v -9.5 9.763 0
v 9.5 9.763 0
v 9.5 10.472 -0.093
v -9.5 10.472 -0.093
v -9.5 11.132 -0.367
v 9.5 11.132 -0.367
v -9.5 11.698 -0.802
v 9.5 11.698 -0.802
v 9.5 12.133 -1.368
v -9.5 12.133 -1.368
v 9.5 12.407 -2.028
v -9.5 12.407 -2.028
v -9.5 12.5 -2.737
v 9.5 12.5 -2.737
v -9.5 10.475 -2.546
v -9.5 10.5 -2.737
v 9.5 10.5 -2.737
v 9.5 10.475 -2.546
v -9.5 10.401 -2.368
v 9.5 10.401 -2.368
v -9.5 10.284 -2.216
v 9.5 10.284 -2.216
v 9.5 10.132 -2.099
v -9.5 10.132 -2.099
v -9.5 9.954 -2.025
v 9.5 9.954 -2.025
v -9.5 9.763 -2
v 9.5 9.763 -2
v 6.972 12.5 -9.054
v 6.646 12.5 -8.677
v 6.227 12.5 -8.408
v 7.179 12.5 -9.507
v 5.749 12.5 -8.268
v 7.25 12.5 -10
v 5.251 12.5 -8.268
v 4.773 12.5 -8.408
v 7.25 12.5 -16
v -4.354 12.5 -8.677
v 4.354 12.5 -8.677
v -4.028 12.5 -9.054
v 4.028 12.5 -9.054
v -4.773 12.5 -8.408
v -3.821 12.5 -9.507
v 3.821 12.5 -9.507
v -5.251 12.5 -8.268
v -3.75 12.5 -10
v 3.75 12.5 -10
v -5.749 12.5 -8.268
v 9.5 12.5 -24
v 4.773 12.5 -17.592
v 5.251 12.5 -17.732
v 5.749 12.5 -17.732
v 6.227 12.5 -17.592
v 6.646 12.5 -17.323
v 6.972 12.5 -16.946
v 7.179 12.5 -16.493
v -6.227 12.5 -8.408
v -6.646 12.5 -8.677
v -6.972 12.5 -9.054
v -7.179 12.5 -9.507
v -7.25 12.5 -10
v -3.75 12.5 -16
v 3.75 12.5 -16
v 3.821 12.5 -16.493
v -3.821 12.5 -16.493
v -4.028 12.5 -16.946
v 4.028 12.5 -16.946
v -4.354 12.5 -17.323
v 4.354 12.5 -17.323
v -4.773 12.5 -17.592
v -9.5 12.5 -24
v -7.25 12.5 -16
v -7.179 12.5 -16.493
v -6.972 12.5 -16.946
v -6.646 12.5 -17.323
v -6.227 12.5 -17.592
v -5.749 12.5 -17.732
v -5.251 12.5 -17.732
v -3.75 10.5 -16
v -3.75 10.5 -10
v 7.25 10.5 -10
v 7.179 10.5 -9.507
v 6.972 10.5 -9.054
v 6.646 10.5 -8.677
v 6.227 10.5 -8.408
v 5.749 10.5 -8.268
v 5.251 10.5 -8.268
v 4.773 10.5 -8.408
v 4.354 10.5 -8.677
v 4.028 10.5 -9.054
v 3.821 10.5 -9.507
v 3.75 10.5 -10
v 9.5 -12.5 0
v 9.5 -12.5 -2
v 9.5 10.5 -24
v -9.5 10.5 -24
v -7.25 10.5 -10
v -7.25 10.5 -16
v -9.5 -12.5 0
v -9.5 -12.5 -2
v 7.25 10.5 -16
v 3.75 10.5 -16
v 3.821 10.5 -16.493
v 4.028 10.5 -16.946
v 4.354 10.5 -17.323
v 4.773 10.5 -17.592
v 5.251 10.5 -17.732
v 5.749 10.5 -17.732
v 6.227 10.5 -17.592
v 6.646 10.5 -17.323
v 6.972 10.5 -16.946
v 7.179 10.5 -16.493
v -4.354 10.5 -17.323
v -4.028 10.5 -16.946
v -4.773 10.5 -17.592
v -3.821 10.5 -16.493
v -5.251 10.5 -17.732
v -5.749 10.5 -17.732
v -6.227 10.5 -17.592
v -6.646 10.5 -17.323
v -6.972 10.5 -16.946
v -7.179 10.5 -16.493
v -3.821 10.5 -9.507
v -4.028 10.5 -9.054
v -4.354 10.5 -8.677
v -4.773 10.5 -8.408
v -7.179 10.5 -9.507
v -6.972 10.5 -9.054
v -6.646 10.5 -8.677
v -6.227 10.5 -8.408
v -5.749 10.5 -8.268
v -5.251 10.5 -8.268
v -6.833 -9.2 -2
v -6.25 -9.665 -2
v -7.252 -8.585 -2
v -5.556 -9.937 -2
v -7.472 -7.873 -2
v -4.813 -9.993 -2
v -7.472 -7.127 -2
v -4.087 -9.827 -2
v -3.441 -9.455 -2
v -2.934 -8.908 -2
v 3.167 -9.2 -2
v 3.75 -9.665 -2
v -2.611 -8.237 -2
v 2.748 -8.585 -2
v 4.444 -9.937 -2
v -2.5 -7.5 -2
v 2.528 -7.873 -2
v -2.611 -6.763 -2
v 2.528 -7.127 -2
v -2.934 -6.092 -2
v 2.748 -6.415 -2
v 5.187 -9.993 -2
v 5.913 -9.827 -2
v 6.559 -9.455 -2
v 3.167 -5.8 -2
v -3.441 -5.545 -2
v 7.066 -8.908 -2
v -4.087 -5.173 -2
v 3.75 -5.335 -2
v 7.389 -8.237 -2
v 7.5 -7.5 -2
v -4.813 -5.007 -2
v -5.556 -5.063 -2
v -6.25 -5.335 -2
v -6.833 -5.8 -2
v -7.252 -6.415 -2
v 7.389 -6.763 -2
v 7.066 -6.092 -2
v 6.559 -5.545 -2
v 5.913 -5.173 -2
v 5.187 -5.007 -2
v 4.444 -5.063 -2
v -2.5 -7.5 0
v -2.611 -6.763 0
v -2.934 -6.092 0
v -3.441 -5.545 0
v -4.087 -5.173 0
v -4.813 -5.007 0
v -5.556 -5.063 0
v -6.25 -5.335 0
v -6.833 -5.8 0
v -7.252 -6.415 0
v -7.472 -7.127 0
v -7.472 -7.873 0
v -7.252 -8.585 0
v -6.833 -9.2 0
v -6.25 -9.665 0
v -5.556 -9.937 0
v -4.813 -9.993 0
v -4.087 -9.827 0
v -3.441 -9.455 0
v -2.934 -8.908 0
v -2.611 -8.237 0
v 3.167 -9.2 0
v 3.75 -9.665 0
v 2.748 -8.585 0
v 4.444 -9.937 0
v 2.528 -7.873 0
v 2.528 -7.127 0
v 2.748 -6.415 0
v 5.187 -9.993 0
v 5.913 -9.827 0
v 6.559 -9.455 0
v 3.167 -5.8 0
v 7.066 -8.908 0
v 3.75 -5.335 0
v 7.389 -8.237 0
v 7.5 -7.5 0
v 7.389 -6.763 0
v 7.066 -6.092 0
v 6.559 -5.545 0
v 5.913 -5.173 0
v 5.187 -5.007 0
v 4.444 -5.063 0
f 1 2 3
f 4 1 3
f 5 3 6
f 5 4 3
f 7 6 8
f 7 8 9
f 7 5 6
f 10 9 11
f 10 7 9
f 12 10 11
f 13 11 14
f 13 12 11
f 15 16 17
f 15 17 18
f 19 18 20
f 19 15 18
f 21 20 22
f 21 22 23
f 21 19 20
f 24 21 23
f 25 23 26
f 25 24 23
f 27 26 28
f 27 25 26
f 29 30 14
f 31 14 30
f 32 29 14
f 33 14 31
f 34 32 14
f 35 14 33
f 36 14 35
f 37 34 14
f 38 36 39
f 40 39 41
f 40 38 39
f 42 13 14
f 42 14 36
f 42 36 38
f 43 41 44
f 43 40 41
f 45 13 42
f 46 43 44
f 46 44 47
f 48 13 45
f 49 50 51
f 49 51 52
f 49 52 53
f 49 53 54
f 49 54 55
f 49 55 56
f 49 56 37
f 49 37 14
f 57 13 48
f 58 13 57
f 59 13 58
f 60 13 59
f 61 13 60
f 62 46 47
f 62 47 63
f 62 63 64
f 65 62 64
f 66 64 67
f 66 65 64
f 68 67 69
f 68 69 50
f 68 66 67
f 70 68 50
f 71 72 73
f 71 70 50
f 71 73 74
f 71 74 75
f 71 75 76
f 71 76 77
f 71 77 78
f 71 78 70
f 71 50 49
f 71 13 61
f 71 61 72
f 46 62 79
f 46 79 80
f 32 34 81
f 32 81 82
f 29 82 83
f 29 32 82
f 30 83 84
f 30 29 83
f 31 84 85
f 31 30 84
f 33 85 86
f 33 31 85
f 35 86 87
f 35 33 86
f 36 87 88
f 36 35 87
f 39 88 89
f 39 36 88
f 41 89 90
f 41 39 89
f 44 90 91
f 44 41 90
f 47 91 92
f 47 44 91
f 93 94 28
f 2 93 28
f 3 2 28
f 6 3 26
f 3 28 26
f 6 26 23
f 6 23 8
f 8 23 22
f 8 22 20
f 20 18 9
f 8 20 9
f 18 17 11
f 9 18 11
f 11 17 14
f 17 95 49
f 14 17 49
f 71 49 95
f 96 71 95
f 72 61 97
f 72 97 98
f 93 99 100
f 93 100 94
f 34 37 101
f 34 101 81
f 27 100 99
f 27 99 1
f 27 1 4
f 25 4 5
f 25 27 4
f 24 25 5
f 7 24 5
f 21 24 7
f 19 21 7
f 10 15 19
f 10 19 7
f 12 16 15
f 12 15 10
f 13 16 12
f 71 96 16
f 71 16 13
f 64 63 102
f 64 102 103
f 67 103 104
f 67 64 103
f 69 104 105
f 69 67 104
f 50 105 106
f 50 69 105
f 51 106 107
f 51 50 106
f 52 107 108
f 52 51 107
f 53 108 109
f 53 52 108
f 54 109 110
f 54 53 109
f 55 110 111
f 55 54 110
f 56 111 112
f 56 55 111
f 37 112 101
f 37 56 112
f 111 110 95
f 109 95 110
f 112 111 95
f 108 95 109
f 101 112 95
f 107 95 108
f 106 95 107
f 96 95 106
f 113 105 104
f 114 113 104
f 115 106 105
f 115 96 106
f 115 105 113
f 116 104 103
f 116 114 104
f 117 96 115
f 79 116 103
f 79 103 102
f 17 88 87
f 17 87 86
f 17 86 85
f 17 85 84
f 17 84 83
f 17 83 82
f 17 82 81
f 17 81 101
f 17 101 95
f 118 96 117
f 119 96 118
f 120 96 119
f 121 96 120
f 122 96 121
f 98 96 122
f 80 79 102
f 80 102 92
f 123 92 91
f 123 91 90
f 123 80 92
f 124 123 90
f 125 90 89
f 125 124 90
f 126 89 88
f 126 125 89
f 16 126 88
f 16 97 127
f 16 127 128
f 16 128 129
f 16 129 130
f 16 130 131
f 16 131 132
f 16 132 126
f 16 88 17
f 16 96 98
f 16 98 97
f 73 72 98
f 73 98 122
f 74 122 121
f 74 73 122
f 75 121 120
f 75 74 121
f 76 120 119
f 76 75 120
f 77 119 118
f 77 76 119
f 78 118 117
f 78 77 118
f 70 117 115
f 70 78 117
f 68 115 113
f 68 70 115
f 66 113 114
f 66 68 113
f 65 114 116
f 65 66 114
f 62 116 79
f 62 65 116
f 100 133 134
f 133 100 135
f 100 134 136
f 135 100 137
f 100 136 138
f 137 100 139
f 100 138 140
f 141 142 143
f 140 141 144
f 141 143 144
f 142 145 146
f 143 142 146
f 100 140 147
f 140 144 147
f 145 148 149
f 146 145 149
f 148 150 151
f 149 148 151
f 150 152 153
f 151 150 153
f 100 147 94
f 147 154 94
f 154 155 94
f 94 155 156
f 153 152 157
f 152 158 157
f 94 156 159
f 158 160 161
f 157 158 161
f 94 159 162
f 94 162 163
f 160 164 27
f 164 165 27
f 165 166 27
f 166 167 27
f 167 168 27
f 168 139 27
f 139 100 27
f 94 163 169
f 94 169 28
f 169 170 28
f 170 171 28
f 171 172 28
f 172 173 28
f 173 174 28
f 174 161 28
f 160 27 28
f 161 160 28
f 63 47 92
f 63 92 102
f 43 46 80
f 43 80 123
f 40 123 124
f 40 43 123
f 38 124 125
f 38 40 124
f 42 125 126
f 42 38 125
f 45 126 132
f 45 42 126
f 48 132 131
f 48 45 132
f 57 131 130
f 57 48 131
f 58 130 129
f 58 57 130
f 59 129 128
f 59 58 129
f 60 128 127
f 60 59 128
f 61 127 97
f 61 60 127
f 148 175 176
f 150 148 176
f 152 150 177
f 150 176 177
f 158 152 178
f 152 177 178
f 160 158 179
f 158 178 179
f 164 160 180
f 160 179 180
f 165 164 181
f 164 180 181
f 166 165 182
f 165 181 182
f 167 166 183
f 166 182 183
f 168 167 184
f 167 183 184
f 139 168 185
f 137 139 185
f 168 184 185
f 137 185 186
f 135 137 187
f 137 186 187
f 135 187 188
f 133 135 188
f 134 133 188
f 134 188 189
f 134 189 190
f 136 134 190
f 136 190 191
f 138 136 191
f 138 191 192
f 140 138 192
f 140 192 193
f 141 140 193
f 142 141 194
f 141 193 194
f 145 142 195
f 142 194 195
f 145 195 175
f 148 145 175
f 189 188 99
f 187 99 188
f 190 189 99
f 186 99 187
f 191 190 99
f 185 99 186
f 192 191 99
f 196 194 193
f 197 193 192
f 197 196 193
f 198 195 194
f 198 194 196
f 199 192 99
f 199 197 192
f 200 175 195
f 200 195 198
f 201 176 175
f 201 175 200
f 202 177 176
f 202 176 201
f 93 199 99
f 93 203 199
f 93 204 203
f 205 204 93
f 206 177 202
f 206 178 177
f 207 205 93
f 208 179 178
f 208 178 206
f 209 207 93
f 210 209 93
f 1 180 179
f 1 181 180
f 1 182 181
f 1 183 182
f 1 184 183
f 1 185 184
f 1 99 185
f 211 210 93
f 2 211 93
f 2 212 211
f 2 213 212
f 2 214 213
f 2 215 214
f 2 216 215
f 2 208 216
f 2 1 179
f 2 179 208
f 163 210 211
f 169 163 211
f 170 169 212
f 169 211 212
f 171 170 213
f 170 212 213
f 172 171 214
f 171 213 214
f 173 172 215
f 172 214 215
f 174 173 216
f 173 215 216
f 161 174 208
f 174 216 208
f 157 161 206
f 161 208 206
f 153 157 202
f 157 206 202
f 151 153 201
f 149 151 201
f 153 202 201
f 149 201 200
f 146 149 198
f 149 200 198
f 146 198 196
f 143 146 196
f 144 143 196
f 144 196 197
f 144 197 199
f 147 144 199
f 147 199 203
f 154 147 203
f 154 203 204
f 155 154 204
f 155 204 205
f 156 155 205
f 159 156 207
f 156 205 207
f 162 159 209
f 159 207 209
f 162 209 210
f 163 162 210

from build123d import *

# Parameters (mm, degrees)
SKETCH_1_W                       = 19
SKETCH_1_H                       = 25
SKETCH_1_R                       = 2.5
SM_BASE_FLANGE_1_DEPTH           = 2
SM_EDGE_FLANGE_1_STRIP_W         = 9.4732
SM_EDGE_FLANGE_1_STRIP_H         = 2
SM_EDGE_FLANGE_1_STRIP_CUT_DEPTH = 19
SM_EDGE_FLANGE_1_DEPTH           = 19
CUT_EXTRUDE_1_DEPTH              = 10


# Sheet-metal steps are written as plain solids
with BuildPart() as part:
    # Sketch 1 → 基体-法兰1 (new body)
    with BuildSketch(Plane.XY):
        Rectangle(SKETCH_1_W, SKETCH_1_H)
        with Locations((-5, -7.5)):
            Circle(SKETCH_1_R, mode=Mode.SUBTRACT)
        with Locations((5, -7.5)):
            Circle(SKETCH_1_R, mode=Mode.SUBTRACT)
    extrude(amount=-SM_BASE_FLANGE_1_DEPTH)

    # 边线-法兰1 strip (across the edge) → 边线-法兰1 strip cut (cut)
    with BuildSketch(Plane(origin=(-9.5, 12.5, -2), x_dir=(0, -1, 0), z_dir=(1, 0, 0))):
        with Locations((-2, -1)):
            Rectangle(SM_EDGE_FLANGE_1_STRIP_W, SM_EDGE_FLANGE_1_STRIP_H)
    extrude(amount=SM_EDGE_FLANGE_1_STRIP_CUT_DEPTH, mode=Mode.SUBTRACT)

    # 边线-法兰1 section (across the edge) → 边线-法兰1 (add)
    with BuildSketch(Plane(origin=(-9.5, 12.5, -2), x_dir=(0, -1, 0), z_dir=(1, 0, 0))):
        with BuildLine():
            Line((0, 0.7366), (0, 22))
            Line((0, 22), (2, 22))
            Line((2, 22), (2, 0.7366))
            ThreePointArc((2, 0.7366), (2.215745145, 0.215745145), (2.7366, 0))
            Line((2.7366, 0), (2.7366, -2))
            ThreePointArc((2.7366, -2), (0.801531583, -1.198468417), (0, 0.7366))
        make_face()
    extrude(amount=SM_EDGE_FLANGE_1_DEPTH)

    # 草图6 → 切除-拉伸1 (cut)
    with BuildSketch(Plane(origin=(0, 12.5, 0), x_dir=(1, 0, 0), z_dir=(0, 1, 0))):
        with BuildLine():
            Line((-7.25, 10), (-7.25, 16))
            ThreePointArc((-7.25, 16), (-5.5, 17.75), (-3.75, 16))
            Line((-3.75, 16), (-3.75, 10))
            ThreePointArc((-3.75, 10), (-5.5, 8.25), (-7.25, 10))
        make_face()
        with BuildLine():
            Line((3.75, 10), (3.75, 16))
            ThreePointArc((3.75, 16), (5.5, 17.75), (7.25, 16))
            Line((7.25, 16), (7.25, 10))
            ThreePointArc((7.25, 10), (5.5, 8.25), (3.75, 10))
        make_face()
    extrude(amount=-CUT_EXTRUDE_1_DEPTH, mode=Mode.SUBTRACT)


solid = part.part
